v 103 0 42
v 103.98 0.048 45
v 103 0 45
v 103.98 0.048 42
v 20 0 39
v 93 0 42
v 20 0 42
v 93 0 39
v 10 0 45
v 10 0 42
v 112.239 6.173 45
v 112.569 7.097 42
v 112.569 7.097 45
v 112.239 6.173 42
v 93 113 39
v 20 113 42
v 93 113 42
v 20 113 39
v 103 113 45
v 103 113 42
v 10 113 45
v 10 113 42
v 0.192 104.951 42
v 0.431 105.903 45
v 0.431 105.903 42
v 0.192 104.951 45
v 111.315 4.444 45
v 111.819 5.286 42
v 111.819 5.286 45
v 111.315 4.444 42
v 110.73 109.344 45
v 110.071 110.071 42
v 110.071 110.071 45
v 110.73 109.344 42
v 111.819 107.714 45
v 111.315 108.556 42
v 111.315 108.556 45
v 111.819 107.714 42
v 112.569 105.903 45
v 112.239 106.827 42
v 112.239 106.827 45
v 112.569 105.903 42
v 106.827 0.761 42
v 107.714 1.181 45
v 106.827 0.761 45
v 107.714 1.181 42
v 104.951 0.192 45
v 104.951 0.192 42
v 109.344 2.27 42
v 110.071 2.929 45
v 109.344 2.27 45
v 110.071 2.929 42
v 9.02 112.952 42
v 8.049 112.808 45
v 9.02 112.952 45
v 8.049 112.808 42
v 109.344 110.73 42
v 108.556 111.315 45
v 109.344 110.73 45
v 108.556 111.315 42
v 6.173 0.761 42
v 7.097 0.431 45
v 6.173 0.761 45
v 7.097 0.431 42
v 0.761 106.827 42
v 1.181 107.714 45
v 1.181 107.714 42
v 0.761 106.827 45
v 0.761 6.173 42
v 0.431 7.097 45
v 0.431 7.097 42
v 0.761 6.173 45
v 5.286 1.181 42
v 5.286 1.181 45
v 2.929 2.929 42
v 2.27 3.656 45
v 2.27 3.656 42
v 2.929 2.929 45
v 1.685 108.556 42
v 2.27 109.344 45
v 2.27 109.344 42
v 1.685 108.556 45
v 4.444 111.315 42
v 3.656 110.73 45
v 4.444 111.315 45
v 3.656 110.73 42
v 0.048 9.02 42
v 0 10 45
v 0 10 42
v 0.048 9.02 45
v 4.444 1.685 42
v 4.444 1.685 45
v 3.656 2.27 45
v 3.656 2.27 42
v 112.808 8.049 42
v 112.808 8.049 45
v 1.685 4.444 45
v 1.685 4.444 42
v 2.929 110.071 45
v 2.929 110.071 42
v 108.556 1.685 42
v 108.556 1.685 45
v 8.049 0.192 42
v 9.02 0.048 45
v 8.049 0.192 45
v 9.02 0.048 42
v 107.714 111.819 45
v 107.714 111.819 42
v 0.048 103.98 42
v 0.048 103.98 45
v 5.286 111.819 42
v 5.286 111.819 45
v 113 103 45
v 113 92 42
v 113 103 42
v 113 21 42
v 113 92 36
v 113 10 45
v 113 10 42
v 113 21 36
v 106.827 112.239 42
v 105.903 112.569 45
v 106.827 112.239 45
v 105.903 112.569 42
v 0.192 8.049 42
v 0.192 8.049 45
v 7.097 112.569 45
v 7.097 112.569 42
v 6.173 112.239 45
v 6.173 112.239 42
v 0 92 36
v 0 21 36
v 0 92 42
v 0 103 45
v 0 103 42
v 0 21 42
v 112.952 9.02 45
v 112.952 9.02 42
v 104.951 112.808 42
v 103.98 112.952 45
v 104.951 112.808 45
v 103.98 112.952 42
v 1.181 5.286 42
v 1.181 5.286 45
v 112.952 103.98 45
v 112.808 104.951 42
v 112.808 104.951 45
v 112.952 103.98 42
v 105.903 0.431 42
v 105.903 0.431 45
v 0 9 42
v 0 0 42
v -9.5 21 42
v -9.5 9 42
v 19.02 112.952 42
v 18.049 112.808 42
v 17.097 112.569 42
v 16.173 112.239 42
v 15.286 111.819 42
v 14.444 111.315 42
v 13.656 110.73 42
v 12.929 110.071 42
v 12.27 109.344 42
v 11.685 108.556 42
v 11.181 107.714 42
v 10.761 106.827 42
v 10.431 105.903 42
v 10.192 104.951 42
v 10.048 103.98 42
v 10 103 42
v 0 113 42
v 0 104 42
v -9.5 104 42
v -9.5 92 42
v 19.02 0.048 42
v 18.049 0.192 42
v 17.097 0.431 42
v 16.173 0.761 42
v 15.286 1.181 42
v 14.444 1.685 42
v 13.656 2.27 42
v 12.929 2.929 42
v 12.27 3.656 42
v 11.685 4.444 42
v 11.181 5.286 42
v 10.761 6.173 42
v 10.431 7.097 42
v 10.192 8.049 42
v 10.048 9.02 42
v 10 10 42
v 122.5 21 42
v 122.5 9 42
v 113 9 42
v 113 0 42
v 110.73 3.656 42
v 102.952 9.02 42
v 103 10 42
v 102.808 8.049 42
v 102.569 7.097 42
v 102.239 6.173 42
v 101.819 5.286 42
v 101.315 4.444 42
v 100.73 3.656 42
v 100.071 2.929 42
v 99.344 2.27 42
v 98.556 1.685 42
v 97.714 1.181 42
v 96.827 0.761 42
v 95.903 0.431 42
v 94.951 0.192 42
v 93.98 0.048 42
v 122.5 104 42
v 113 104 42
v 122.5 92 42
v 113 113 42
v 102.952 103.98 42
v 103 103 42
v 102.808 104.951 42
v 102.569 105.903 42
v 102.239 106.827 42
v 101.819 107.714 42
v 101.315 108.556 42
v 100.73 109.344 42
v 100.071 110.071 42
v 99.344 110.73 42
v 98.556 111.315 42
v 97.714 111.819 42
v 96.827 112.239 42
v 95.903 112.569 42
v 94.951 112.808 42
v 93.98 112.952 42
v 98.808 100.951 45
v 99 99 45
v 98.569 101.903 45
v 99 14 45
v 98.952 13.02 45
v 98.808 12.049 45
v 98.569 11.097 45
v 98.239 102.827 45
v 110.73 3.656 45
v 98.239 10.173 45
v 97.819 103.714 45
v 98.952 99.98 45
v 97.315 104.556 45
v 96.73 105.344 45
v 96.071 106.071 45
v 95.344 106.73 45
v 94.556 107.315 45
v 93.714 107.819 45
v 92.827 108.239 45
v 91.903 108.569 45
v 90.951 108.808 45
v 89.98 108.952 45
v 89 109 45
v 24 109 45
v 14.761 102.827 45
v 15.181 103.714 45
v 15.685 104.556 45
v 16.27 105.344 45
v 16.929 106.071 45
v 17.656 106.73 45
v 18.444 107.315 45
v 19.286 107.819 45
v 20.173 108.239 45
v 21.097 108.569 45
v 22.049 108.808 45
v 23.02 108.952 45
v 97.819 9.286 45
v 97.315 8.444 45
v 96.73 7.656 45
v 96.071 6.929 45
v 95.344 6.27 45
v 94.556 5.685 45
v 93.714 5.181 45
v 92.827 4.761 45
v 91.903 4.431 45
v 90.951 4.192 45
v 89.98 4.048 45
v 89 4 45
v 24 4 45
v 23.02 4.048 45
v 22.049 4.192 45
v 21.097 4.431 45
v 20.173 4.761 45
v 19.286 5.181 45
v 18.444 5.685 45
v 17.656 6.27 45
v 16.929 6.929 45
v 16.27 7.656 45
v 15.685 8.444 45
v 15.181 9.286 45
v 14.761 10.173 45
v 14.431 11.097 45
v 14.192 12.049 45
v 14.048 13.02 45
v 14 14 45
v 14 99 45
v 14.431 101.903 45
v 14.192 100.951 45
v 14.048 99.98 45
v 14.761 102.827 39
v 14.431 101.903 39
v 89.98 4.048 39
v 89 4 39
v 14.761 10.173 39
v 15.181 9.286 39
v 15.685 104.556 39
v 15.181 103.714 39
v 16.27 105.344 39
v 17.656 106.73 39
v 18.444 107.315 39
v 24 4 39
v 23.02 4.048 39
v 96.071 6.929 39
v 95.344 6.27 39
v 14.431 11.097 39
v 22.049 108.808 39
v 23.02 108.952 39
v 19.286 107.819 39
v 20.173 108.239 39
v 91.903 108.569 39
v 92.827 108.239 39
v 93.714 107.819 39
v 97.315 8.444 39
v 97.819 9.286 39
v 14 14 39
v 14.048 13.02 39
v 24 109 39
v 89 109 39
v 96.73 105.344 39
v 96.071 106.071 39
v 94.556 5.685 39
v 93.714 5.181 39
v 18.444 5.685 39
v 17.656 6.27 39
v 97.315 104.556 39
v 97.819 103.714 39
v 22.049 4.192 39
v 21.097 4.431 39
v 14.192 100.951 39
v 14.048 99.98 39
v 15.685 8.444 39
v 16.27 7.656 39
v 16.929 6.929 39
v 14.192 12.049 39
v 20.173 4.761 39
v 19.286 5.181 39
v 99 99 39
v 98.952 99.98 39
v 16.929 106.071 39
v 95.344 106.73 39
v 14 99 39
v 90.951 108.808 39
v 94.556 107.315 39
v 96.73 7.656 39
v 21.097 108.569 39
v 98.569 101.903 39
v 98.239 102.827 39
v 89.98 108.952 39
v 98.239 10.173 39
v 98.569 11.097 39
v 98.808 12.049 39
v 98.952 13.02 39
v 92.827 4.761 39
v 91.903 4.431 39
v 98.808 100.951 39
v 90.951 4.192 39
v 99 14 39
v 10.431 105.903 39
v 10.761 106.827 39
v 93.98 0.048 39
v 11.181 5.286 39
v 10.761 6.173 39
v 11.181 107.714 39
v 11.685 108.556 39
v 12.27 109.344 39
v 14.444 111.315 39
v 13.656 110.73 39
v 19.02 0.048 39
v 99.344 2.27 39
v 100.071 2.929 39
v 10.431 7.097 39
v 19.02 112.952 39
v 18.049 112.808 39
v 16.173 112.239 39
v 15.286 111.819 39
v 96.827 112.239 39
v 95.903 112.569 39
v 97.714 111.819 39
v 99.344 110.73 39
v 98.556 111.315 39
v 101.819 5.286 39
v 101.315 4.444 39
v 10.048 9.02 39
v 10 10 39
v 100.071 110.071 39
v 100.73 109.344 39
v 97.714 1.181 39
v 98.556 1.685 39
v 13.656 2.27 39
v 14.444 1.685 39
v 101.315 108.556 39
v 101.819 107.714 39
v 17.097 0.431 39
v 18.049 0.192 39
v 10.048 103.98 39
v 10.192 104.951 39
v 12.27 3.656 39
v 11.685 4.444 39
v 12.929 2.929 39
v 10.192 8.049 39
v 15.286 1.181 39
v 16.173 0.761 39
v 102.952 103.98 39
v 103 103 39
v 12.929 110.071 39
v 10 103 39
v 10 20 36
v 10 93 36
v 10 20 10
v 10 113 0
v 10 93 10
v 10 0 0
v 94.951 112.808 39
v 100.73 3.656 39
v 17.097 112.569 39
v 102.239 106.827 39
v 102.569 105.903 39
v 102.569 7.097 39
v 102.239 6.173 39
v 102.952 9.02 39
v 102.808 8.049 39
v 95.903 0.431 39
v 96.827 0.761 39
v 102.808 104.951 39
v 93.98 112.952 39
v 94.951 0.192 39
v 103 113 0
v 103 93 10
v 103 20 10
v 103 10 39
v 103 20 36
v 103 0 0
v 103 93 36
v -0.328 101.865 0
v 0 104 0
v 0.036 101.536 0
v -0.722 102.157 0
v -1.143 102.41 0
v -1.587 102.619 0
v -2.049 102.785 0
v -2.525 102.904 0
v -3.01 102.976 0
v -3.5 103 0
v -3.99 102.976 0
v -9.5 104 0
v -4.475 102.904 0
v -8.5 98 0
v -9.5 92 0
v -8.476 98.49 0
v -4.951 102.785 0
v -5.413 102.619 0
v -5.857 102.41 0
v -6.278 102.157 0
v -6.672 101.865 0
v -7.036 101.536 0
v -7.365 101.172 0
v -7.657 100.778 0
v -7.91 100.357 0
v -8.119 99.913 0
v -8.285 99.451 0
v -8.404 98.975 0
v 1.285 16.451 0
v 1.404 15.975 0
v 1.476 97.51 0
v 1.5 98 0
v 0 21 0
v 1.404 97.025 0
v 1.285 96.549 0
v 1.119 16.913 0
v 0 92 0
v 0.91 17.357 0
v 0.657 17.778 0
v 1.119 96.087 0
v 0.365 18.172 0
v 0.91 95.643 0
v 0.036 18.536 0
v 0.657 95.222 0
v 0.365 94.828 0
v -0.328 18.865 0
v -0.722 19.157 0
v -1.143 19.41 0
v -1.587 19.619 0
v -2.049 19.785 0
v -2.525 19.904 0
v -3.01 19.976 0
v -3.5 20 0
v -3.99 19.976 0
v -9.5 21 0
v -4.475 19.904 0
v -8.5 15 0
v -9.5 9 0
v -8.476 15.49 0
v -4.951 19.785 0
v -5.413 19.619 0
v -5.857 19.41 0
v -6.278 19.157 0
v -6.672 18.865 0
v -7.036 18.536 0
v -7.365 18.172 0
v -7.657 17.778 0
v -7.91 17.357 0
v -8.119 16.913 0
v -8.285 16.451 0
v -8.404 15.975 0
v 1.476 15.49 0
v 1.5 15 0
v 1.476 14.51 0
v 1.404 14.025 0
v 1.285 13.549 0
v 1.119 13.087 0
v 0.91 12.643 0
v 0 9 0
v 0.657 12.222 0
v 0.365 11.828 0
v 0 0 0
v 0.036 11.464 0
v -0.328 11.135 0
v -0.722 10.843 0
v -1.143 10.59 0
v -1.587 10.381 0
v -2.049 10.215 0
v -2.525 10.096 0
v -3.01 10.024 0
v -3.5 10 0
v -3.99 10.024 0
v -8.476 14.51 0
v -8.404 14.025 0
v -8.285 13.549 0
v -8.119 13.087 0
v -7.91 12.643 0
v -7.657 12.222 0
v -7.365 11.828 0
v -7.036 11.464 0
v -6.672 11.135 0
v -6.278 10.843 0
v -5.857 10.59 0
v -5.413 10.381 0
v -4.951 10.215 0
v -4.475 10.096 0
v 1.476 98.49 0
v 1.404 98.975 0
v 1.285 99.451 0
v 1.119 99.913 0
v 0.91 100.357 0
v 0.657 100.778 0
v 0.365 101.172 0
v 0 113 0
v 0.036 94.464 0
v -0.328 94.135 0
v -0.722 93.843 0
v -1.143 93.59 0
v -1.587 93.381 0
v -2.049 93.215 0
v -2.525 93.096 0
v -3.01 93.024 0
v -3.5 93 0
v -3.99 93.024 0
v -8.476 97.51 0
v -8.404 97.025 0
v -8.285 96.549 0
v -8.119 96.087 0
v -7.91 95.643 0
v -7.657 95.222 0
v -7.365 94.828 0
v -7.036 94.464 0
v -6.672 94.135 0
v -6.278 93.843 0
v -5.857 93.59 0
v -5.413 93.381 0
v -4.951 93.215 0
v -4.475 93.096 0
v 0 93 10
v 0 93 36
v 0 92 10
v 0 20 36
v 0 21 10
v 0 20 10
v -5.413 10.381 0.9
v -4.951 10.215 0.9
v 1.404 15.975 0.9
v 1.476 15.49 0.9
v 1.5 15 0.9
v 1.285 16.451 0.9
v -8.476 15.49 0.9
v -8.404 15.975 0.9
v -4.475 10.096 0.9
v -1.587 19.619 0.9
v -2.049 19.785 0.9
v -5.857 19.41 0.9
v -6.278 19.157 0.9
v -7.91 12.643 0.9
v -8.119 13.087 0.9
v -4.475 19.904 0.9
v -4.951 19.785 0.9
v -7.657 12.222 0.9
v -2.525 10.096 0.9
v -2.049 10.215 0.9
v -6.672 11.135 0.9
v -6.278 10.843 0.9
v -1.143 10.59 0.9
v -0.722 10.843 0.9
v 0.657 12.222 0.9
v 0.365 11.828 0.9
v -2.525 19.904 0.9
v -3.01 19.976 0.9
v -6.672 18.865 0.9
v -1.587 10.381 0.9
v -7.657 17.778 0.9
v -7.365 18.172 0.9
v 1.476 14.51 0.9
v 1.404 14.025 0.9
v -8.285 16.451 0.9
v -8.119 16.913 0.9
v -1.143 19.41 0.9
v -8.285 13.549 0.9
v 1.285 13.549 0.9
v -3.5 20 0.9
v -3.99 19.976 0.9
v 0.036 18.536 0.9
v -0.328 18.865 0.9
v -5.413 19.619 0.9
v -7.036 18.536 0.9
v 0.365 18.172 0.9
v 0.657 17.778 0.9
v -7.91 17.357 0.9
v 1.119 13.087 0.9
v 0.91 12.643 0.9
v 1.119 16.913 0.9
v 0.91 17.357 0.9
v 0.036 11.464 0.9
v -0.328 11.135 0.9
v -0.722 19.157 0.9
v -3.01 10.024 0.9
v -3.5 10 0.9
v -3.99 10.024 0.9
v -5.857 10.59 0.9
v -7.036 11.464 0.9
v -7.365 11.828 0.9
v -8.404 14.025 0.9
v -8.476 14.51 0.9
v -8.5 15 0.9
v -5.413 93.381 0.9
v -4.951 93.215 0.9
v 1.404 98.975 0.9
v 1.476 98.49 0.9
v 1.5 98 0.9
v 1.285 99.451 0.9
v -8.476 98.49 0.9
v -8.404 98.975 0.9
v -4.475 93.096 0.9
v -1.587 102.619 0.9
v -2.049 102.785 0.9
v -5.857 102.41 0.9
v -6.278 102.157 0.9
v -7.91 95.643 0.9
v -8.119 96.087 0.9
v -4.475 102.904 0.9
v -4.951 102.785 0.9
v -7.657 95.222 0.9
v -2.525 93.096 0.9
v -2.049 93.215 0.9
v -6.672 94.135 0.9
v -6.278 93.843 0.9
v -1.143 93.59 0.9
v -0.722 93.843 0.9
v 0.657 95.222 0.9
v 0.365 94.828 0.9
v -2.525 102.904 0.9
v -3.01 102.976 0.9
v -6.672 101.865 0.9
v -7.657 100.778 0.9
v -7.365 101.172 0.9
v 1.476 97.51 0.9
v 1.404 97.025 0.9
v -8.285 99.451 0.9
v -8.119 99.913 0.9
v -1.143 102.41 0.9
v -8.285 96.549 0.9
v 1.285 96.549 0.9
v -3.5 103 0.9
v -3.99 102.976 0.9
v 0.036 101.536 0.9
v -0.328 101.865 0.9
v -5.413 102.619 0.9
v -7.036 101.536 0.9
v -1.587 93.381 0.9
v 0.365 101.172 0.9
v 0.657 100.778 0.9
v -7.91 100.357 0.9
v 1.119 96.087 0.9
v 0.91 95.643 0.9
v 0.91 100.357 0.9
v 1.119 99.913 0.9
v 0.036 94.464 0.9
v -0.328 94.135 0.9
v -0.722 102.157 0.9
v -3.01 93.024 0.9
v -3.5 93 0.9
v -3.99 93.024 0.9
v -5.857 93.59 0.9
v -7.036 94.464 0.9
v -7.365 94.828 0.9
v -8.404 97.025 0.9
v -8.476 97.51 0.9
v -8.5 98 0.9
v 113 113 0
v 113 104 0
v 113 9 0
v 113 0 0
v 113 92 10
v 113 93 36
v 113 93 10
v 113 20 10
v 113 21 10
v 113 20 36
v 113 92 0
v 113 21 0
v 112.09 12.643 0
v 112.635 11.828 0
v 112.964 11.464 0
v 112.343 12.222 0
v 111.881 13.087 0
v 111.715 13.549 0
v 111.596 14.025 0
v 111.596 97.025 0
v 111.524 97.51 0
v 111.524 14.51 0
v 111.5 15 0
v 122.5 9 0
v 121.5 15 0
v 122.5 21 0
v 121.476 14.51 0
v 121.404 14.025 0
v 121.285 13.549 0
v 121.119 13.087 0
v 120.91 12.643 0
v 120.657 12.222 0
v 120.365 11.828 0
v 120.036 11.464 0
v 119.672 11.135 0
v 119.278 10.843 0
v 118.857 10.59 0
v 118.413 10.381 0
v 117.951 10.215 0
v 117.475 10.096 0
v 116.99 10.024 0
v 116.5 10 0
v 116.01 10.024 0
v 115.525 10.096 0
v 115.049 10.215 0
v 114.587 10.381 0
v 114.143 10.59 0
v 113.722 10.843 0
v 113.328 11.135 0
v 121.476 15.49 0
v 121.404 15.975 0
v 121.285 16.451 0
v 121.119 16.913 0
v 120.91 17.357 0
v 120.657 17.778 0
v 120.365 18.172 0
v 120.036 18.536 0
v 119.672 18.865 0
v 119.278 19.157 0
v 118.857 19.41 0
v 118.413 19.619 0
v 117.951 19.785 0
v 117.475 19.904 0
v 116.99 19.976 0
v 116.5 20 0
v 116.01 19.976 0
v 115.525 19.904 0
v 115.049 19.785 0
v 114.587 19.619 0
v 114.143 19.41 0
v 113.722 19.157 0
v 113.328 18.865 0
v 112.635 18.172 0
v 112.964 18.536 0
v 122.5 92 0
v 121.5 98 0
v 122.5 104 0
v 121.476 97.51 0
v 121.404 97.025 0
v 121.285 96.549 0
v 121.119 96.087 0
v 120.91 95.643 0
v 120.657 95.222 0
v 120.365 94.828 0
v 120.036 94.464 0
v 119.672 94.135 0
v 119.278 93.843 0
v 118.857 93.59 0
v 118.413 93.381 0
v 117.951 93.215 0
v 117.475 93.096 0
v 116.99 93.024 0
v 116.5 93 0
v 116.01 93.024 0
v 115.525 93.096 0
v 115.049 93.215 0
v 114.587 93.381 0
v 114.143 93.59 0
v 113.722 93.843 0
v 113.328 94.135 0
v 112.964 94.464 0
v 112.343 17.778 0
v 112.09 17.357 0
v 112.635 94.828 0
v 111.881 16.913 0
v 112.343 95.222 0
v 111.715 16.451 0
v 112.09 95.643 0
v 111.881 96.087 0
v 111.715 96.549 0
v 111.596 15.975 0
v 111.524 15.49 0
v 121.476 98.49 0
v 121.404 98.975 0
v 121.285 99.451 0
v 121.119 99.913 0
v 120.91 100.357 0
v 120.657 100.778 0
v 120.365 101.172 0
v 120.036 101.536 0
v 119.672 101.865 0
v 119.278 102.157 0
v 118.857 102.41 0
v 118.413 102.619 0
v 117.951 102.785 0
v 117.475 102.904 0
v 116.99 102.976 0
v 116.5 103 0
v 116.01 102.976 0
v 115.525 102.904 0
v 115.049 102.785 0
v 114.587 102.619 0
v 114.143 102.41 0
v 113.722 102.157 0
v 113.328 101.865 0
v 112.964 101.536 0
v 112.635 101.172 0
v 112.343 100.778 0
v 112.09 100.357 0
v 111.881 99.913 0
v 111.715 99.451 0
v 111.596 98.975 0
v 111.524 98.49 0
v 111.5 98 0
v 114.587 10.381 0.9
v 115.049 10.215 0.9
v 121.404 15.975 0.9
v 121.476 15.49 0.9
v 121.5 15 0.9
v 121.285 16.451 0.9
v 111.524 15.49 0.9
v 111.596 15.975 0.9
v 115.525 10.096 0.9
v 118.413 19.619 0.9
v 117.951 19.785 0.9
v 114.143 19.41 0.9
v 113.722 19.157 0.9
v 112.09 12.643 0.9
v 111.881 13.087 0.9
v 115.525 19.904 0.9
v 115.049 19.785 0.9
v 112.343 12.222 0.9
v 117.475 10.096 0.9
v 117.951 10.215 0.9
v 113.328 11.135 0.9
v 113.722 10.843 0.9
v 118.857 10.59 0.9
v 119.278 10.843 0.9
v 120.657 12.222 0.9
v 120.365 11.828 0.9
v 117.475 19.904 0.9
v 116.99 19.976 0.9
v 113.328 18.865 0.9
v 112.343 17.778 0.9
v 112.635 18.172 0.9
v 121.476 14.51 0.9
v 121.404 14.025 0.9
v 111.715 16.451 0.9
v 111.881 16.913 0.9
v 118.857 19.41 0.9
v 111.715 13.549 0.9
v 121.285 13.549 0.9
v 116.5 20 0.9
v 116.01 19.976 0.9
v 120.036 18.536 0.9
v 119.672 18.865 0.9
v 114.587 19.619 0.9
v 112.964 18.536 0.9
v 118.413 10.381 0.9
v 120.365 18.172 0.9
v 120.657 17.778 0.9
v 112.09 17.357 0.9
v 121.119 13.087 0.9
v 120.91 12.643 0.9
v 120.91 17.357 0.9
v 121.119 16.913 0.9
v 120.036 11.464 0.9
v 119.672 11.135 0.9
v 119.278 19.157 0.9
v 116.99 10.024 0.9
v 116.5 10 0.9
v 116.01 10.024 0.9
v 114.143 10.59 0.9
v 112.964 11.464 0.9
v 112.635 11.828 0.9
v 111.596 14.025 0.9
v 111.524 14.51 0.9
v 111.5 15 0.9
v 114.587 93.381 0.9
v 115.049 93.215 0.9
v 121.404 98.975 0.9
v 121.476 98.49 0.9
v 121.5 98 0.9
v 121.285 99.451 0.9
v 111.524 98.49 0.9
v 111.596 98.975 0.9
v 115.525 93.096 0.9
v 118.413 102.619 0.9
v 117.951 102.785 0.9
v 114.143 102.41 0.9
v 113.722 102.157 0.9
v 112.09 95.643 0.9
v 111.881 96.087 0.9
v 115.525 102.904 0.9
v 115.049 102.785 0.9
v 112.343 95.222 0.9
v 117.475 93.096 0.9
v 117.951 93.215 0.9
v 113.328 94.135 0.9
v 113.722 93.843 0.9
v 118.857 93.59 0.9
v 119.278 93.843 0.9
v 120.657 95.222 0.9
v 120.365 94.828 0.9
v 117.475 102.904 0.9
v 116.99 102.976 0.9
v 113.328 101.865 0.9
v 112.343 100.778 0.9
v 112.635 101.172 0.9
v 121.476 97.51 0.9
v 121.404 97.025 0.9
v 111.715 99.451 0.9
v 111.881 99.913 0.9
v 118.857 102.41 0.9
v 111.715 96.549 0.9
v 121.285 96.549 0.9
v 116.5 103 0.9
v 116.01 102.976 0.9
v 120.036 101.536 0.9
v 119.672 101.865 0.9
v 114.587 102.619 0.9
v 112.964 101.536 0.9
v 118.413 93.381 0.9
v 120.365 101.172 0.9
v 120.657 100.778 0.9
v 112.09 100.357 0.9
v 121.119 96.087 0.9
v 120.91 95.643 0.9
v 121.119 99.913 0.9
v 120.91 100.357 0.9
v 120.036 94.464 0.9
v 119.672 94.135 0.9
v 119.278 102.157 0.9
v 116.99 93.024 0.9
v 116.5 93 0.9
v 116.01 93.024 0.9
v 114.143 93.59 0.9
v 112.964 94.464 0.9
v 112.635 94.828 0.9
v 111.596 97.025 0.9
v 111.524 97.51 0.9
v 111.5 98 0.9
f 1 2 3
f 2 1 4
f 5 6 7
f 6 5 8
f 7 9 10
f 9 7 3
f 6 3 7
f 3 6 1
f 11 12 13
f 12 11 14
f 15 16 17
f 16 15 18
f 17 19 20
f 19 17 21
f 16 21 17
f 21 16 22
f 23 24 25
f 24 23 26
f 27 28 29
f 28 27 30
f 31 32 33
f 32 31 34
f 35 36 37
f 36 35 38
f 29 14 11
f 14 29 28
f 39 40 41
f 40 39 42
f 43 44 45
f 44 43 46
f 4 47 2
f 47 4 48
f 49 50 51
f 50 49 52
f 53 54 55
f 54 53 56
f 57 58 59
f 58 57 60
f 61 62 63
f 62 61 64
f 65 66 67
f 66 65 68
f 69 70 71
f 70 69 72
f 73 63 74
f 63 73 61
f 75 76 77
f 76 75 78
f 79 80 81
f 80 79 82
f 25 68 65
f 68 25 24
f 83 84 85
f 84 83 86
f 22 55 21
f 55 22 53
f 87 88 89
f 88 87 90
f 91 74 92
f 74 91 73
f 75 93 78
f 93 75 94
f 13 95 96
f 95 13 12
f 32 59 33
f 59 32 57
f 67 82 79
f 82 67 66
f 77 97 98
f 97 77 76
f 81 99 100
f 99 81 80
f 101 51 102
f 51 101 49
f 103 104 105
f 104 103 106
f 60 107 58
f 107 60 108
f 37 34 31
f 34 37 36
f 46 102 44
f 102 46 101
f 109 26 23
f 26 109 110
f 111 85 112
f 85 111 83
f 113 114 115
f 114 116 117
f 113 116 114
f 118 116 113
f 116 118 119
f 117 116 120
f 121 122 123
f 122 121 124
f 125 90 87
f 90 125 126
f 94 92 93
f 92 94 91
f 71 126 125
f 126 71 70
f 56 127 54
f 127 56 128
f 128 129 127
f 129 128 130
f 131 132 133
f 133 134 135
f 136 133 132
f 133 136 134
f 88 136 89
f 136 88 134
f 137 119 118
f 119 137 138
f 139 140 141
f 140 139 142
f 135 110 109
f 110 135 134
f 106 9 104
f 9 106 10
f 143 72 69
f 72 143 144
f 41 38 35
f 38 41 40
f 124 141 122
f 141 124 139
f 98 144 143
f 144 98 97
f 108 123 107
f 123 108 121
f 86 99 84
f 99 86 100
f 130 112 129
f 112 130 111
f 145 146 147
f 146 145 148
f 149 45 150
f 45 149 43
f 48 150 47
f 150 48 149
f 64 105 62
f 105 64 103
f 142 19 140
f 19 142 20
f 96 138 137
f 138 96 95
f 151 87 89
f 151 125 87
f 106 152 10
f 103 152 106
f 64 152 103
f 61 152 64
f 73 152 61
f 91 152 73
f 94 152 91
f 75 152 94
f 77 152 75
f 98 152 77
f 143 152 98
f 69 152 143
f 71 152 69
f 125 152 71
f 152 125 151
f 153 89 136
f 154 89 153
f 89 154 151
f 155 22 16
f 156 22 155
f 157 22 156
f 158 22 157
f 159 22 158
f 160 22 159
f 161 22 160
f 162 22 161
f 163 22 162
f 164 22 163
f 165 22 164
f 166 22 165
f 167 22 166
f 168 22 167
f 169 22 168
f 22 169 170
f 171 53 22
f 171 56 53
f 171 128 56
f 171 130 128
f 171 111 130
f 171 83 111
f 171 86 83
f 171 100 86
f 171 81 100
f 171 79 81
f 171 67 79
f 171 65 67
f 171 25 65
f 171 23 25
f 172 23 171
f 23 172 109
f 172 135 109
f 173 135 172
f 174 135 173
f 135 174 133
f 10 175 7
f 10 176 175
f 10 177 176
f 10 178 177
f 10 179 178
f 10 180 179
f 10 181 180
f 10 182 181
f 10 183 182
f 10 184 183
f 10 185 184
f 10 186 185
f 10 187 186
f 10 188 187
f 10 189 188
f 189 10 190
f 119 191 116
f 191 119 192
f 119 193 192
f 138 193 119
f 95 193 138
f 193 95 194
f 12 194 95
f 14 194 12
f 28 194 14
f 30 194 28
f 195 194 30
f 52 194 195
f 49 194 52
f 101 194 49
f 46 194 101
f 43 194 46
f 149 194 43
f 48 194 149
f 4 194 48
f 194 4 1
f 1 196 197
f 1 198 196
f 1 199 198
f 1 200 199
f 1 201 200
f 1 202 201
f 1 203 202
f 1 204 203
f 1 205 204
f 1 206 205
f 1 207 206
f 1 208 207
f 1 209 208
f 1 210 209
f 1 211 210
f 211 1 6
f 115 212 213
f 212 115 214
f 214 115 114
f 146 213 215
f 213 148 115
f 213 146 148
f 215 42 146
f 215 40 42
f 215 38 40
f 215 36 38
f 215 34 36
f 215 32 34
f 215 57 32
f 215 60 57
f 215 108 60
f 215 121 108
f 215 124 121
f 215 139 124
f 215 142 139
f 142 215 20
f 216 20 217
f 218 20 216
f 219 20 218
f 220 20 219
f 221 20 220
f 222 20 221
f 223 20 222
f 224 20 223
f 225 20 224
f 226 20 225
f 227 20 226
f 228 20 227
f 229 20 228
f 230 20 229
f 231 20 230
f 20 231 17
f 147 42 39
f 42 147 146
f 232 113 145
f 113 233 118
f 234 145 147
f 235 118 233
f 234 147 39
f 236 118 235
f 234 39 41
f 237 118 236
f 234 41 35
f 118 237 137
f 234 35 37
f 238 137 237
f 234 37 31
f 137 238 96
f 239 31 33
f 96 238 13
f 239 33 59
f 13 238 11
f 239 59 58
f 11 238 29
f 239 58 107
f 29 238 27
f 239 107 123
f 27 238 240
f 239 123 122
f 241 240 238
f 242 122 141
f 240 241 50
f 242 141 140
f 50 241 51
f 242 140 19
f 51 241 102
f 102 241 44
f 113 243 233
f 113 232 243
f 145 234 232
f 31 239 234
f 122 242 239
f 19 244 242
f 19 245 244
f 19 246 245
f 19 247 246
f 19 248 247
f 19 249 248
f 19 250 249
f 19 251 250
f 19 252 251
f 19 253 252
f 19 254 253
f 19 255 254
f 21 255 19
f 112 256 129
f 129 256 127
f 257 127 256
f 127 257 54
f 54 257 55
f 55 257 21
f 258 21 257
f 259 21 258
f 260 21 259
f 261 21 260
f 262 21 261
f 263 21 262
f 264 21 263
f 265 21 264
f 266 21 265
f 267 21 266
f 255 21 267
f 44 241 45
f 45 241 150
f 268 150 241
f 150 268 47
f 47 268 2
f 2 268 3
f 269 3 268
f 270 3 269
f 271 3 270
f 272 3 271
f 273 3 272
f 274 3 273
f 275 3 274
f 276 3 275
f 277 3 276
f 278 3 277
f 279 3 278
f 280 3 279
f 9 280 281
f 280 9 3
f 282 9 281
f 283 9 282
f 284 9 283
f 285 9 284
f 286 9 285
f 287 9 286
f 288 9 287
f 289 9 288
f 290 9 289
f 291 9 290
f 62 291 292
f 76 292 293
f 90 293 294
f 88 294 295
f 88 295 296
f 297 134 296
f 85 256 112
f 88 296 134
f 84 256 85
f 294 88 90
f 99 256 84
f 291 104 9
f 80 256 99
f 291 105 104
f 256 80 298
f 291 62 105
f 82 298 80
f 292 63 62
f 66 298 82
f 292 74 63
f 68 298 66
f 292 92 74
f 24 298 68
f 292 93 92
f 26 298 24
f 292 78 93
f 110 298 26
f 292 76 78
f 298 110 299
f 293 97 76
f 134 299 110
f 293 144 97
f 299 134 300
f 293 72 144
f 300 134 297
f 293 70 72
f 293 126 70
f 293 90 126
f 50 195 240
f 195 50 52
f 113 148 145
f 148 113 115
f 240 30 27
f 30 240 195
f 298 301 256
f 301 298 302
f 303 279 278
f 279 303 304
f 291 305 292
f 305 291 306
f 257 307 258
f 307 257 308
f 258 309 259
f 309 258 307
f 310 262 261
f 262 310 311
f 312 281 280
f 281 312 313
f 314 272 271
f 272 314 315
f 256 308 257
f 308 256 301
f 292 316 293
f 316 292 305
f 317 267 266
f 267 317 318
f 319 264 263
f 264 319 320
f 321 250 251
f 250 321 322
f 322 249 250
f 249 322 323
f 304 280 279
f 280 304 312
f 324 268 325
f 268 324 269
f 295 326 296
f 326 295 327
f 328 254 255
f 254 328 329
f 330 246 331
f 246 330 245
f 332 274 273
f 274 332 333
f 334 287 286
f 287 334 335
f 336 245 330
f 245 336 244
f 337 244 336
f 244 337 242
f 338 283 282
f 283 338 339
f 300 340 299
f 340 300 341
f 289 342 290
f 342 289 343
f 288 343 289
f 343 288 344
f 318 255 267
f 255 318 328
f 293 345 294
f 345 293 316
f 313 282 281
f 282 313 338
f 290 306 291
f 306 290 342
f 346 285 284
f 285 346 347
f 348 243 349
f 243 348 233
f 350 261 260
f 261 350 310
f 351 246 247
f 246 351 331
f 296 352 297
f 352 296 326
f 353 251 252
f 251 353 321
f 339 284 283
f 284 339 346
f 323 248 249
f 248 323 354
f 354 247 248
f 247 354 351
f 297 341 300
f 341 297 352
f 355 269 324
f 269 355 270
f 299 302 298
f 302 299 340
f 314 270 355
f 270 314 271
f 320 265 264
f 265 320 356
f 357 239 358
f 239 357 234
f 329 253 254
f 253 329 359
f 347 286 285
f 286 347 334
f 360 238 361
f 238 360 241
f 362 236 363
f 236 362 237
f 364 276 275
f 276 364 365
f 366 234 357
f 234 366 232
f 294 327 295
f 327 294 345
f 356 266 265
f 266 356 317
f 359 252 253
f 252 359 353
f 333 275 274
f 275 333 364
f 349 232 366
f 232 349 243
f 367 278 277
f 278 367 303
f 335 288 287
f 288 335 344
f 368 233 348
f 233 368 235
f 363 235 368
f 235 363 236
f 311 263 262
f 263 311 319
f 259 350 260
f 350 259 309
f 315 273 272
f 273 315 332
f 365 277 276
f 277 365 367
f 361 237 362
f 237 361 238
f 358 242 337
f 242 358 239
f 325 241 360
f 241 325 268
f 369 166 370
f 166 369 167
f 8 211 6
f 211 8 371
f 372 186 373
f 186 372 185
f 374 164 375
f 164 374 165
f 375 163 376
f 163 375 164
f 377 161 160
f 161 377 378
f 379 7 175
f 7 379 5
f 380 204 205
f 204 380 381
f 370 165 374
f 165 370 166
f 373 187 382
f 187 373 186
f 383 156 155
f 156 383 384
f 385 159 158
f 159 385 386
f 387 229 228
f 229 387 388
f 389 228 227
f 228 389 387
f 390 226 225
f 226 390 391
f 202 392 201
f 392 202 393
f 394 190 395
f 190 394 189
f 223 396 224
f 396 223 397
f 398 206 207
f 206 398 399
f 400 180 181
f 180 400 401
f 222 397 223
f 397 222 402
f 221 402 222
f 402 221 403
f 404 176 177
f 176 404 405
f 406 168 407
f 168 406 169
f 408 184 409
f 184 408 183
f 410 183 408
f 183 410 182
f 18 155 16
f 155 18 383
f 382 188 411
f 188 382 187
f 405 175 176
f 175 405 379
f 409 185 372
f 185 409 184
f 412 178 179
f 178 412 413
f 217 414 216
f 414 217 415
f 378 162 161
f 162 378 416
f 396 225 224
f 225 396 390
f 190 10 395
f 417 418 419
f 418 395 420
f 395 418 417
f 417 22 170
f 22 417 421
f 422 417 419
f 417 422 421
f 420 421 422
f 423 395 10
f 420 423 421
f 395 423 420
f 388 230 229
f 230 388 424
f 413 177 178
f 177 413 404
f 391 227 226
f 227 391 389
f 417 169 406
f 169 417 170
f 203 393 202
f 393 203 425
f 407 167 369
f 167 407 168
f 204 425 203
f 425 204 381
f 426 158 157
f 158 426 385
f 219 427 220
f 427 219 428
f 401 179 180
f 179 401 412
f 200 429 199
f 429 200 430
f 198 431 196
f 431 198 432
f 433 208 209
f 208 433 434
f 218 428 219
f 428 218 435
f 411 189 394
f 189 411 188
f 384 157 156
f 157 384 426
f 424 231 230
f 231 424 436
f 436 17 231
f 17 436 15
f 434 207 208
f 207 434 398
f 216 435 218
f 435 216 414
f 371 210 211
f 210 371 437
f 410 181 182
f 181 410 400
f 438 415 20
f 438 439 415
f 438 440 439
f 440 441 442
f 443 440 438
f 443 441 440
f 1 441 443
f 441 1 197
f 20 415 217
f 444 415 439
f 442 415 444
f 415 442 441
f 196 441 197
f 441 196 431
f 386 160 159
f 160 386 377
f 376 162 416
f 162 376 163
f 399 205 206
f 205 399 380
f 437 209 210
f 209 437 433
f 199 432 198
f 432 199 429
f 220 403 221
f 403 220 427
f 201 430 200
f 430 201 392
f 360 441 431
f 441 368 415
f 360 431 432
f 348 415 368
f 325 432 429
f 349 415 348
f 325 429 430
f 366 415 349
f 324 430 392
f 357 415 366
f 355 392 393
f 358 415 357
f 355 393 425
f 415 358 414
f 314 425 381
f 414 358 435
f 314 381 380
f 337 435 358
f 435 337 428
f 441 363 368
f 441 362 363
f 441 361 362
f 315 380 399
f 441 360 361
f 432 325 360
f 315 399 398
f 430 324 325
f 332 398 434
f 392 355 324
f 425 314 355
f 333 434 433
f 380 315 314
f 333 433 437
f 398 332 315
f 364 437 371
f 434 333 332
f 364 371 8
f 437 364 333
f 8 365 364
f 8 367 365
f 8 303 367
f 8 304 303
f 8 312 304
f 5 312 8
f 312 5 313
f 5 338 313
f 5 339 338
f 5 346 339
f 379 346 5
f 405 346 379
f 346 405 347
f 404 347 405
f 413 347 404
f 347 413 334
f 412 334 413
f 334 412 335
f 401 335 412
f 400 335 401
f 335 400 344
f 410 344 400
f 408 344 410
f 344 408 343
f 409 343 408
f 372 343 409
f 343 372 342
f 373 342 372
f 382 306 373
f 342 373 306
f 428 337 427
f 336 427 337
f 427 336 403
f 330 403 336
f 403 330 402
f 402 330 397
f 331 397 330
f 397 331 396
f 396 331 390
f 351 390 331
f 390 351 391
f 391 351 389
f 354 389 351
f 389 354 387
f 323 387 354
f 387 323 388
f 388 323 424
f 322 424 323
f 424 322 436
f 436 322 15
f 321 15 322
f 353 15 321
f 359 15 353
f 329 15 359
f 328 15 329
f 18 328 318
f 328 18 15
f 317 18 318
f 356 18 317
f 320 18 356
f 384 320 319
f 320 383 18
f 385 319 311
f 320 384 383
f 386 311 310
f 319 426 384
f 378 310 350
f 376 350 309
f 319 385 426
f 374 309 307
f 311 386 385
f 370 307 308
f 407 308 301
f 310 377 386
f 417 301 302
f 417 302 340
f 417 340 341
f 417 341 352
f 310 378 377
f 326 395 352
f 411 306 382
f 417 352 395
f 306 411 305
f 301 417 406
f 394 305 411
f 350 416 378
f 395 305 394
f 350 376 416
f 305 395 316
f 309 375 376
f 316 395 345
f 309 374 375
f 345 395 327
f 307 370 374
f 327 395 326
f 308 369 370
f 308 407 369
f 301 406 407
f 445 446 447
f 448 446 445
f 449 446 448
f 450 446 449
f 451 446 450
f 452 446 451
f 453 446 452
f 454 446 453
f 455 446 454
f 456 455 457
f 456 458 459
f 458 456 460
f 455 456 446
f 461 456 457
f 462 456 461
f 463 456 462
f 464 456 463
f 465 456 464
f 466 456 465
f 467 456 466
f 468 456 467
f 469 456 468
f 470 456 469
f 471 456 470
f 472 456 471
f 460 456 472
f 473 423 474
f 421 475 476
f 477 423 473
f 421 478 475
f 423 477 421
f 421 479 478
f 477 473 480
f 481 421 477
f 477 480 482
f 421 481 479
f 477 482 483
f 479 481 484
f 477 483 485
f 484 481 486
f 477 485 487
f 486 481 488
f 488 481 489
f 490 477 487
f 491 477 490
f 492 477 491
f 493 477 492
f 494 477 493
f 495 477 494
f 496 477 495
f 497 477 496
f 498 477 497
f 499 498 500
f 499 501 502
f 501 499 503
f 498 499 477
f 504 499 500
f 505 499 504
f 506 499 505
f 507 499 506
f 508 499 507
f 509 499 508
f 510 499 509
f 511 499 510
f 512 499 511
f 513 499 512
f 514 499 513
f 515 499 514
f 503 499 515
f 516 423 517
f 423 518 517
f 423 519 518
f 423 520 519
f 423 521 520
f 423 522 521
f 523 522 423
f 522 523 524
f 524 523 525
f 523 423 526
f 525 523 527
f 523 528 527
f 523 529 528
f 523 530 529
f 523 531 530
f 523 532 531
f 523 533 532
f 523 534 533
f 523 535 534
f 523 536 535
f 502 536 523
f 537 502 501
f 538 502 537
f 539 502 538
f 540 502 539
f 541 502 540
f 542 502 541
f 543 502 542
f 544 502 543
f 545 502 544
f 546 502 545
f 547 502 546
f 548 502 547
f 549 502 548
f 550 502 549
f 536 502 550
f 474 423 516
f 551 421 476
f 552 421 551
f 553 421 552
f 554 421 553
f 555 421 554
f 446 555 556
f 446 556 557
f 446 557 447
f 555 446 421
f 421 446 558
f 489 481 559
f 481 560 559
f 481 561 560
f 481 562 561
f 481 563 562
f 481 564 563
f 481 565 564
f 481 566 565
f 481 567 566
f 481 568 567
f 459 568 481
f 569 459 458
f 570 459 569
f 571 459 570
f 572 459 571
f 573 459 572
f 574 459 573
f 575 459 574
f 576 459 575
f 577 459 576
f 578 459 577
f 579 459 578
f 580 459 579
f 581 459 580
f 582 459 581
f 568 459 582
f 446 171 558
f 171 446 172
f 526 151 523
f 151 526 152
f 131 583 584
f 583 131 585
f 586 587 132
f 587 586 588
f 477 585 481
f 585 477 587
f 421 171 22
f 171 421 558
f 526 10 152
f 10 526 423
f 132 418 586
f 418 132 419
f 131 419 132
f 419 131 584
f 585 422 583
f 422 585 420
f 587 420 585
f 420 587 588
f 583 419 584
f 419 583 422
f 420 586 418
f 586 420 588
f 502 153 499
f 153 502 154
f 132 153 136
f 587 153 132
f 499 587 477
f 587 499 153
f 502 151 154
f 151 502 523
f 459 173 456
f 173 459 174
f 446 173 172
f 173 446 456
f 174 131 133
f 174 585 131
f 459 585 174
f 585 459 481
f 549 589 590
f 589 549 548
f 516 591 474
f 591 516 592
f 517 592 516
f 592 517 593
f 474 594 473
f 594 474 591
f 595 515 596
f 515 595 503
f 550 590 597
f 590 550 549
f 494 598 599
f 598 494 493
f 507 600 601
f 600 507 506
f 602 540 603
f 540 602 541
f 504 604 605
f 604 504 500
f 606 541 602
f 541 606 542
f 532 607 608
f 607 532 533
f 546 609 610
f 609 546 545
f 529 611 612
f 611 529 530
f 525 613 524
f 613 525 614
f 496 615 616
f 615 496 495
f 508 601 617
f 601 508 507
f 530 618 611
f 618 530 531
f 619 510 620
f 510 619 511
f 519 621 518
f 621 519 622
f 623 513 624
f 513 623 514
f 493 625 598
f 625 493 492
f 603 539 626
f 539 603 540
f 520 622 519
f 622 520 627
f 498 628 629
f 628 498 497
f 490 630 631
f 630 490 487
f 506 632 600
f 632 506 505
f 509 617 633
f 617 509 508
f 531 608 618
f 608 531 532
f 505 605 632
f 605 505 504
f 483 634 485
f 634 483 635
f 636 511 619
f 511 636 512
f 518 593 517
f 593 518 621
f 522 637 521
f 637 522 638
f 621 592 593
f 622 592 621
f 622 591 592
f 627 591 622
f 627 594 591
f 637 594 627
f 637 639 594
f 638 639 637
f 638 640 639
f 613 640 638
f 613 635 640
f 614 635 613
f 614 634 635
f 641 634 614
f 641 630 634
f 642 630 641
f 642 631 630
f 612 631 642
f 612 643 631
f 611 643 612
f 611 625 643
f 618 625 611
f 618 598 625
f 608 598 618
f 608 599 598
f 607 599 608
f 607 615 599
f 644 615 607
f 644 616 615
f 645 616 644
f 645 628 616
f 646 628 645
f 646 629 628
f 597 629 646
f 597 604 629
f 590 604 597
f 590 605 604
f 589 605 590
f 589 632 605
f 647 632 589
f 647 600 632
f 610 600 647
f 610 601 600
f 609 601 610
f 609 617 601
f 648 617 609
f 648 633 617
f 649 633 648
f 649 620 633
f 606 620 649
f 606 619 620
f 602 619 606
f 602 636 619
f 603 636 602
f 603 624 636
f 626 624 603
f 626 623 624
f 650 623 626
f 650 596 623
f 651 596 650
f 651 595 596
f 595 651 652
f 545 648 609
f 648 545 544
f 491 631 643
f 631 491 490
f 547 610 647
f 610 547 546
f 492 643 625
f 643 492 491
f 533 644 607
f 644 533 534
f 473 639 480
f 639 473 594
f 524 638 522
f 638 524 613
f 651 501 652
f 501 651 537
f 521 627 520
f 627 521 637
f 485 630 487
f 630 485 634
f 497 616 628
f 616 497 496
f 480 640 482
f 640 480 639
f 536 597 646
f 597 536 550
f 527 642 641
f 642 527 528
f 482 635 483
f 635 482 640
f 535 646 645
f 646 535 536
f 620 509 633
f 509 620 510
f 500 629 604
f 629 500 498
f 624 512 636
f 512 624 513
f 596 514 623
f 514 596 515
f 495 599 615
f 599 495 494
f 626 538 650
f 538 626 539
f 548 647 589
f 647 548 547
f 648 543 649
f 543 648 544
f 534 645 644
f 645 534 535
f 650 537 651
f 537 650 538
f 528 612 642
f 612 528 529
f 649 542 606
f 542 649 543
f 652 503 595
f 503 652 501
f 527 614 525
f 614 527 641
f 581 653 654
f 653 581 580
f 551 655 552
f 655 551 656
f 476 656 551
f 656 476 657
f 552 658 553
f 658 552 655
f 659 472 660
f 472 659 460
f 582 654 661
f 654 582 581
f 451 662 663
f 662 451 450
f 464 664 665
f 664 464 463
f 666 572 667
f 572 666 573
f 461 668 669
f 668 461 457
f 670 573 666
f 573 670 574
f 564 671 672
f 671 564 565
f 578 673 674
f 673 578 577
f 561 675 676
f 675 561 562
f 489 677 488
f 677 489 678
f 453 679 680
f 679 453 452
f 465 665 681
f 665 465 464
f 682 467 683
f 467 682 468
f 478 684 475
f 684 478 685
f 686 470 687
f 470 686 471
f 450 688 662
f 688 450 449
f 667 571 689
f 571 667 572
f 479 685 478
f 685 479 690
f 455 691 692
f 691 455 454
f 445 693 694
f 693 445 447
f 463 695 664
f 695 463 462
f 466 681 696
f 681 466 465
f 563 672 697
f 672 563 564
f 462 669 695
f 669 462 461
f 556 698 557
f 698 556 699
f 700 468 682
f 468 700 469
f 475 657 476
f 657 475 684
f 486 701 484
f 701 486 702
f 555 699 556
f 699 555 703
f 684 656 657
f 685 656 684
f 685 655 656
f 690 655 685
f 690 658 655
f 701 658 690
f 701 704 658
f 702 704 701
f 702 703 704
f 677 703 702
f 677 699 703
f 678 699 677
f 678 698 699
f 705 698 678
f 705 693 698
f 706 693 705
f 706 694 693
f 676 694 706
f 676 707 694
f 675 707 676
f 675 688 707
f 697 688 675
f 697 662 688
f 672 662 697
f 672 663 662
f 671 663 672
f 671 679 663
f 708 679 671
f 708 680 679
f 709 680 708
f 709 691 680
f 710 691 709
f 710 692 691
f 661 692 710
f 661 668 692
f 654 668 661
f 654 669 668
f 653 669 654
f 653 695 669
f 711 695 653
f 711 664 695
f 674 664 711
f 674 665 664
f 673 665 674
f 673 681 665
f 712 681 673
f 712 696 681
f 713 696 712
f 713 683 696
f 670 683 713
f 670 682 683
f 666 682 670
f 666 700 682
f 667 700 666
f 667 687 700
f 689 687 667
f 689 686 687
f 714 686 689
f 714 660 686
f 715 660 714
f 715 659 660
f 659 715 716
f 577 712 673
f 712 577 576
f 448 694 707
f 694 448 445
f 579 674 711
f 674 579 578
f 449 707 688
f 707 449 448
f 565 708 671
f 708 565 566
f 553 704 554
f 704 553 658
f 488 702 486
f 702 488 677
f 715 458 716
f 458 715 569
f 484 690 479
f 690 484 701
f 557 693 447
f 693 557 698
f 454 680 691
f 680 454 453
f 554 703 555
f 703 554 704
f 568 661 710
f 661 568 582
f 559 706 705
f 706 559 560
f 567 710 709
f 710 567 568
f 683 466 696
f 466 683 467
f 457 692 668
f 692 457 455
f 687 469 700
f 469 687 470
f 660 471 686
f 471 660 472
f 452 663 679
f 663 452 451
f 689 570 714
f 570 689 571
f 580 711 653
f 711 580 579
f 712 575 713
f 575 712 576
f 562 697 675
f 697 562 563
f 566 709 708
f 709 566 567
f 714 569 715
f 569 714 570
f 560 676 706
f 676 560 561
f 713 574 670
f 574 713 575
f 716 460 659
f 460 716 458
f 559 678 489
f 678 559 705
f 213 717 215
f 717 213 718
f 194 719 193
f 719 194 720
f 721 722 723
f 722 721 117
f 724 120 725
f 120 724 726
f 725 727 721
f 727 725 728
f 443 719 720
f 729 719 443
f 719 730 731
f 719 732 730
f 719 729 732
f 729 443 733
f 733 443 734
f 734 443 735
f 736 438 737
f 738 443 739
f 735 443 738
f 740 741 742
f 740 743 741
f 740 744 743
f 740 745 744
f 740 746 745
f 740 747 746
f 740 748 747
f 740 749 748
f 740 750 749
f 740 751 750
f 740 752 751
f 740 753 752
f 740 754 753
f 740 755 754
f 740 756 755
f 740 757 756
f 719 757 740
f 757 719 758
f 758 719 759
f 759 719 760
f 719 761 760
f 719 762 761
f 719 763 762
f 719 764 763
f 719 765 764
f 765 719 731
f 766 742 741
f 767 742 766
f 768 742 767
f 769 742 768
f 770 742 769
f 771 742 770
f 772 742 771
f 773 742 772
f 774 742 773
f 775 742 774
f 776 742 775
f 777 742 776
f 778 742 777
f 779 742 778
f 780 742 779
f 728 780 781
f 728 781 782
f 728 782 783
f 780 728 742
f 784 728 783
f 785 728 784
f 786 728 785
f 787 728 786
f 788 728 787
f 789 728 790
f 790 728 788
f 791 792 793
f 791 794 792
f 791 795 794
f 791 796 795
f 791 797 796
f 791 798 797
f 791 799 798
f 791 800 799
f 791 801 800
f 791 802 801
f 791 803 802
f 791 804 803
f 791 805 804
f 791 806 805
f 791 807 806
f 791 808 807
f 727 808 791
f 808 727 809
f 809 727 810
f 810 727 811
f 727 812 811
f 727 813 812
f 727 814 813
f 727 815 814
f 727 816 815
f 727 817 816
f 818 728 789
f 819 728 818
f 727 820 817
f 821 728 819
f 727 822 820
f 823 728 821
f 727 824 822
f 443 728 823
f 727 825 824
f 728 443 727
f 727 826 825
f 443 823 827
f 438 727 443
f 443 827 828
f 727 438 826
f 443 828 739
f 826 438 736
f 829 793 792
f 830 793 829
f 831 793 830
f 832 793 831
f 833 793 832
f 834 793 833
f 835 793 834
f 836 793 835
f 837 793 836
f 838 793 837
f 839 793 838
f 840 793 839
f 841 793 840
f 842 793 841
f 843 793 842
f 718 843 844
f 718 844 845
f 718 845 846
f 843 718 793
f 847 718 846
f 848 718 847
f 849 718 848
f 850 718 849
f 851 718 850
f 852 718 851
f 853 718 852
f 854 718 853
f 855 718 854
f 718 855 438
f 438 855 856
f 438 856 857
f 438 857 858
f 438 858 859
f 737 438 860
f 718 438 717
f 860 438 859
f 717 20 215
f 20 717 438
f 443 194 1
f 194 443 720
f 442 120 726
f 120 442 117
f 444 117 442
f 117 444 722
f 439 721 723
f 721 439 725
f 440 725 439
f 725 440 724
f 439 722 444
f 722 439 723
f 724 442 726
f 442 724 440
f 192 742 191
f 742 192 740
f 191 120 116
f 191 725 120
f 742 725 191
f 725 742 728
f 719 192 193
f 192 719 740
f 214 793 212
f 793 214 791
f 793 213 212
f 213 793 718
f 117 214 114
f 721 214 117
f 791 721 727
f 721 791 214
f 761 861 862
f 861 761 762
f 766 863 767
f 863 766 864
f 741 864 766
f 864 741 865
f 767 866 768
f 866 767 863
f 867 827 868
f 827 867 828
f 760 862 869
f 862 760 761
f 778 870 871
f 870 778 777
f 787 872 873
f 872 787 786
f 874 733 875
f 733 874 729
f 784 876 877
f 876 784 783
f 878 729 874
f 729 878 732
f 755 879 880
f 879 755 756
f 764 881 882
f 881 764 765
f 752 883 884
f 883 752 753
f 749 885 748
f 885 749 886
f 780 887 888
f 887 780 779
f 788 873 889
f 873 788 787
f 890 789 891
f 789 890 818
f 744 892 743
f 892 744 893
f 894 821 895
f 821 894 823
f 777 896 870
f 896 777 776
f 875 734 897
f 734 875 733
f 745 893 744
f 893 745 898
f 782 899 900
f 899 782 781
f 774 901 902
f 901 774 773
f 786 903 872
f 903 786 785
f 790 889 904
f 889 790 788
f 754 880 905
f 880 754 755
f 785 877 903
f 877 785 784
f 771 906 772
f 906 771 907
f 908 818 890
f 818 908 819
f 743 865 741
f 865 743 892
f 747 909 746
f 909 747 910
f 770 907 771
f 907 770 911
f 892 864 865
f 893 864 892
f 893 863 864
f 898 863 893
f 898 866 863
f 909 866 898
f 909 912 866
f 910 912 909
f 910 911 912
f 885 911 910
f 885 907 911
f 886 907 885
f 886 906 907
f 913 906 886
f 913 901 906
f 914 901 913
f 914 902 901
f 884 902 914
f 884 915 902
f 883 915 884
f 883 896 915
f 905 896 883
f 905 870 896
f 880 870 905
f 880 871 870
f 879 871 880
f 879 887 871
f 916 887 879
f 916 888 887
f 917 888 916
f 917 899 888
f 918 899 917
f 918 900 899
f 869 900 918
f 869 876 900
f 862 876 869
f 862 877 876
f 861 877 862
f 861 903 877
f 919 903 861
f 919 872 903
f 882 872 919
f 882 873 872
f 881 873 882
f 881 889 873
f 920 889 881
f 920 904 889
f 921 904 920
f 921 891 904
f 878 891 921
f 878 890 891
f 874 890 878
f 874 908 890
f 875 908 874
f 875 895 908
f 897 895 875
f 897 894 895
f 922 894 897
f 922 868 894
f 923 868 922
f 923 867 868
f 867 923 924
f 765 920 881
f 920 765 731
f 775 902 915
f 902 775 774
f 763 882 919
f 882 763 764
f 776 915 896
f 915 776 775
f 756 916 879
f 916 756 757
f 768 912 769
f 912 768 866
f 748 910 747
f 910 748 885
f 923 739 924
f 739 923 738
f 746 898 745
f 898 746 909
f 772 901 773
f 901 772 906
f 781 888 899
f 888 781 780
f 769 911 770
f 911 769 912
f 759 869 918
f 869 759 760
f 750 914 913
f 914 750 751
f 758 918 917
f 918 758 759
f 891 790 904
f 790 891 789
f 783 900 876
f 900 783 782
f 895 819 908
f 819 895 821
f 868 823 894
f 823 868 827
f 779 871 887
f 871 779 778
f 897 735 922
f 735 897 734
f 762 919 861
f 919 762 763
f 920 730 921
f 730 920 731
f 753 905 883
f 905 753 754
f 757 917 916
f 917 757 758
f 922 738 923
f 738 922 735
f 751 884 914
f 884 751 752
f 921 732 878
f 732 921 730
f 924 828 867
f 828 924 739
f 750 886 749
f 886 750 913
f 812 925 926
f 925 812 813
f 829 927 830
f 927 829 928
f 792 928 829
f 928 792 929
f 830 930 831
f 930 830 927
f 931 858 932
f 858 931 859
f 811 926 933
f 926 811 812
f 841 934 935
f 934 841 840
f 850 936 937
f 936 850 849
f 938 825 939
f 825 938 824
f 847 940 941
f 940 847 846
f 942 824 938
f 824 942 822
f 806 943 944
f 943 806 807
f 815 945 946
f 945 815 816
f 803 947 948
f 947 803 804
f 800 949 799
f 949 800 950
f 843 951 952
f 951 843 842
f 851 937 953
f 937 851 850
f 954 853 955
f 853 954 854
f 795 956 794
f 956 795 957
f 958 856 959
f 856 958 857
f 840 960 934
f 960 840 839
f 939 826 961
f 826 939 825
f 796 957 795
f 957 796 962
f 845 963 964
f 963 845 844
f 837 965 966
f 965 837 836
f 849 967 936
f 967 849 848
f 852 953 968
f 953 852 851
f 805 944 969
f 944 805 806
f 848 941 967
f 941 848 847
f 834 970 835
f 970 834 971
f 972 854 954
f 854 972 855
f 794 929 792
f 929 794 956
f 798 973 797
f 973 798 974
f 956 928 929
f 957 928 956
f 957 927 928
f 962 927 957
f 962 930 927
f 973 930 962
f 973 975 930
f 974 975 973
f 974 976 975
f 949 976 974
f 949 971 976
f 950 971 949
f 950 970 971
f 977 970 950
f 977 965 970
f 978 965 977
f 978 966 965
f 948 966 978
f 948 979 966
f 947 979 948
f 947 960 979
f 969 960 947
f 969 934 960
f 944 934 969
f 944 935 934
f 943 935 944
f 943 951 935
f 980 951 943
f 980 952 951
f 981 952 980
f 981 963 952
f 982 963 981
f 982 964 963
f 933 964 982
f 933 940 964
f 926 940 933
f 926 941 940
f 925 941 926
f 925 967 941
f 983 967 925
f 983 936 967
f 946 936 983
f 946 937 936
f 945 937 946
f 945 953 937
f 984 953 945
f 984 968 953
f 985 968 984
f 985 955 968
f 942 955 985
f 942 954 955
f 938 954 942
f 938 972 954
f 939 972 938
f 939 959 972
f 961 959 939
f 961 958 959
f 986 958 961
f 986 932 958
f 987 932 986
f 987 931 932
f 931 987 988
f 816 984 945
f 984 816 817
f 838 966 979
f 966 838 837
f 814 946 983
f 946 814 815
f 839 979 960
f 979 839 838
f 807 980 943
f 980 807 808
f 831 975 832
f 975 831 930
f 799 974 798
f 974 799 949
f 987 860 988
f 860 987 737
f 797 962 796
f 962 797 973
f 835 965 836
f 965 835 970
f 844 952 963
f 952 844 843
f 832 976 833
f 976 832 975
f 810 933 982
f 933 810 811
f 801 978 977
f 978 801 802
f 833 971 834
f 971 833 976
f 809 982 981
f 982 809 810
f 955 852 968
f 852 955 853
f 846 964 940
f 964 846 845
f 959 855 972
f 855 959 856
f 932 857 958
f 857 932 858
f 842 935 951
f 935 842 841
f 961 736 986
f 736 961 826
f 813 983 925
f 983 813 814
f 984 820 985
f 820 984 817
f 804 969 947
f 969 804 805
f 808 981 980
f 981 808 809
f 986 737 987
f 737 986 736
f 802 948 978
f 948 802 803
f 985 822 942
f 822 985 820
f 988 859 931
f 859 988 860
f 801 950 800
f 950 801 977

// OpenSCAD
// Apple TV Retention Bracket for 1U Vented Rack Shelf
//
// A top-down retention bracket that secures an Apple TV 4K to a vented rack shelf.
// Side walls connect via a top plate with ventilation cutout.
// Front and back are completely open for cable access and airflow.
// Bracket attaches using M4/M5 screws from below the shelf, threading into
// heat-set inserts embedded in the bracket's insert bosses.
//
// PRINT ORIENTATION: Print upside-down (top plate on build plate) for best results.
// Rotate 180° around X axis in your slicer before printing.
// No supports needed. Use 3+ perimeters for insert boss strength.

/* [Device Dimensions] */
// Width of the Apple TV 4K
device_width = 93; // [80:1:120]
// Depth of the Apple TV 4K
device_depth = 93; // [80:1:120]
// Height of the Apple TV 4K
device_height = 31; // [20:1:50]

/* [Bracket Dimensions] */
// Overall bracket width (device width + 2 × wall thickness)
bracket_width = 113; // [100:1:150]
// Overall bracket depth
bracket_depth = 113; // [100:1:150]
// Top plate thickness
top_plate_thickness = 3; // [2:0.5:5]
// Side wall height (provides 11mm clearance above 31mm device, minus lip_radius for net clearance)
side_wall_height = 42; // [30:1:60]
// Side wall thickness
wall_thickness = 10; // [5:1:15]

/* [Ventilation Cutout] */
// Width of center ventilation cutout
cutout_width = 73; // [50:1:100]
// Depth of center ventilation cutout
cutout_depth = 93; // [50:1:100]

/* [Retention Lip] */
// How far the lip extends inward over the device
lip_overhang = 4; // [2:1:10]
// Thickness of the lip (hangs down from top plate)
lip_thickness = 3; // [2:1:6]
// Corner radius for squircle shape
corner_radius = 10; // [5:1:20]

/* [Threaded Insert Bosses] */
// Insert size: M4 or M5
insert_size = "M4"; // [M4, M5]
// Boss outer diameter
boss_diameter = 12; // [10:1:20]
// Boss height (extends below wall bottom)
boss_height = 10; // [8:1:15]
// M4 insert hole diameter (typical for heat-set inserts)
m4_hole_diameter = 5.6; // [5.0:0.1:6.0]
// M5 insert hole diameter (typical for heat-set inserts)
m5_hole_diameter = 6.4; // [6.0:0.1:7.0]
// Insert hole depth
insert_hole_depth = 8; // [6:1:12]
// Front insert distance from front edge (center of boss)
front_insert_offset = 15; // [10:1:30]
// Back insert distance from back edge (center of boss)
back_insert_offset = 15; // [10:1:30]
// Boss overhang from wall OUTWARD (for slot alignment: 3.5mm gives 120mm = 6 × 20mm spacing)
boss_overhang = 3.5; // [0:0.5:20]

/* [Rendering] */
$fa = 1;
$fn = 64;

// Calculate insert hole diameter based on selected size
insert_hole_diameter = (insert_size == "M5") ? m5_hole_diameter : m4_hole_diameter;

// 2D rounded rectangle (squircle)
module rounded_rect(width, depth, radius) {
    offset(r = radius)
    offset(r = -radius)
        square([width, depth], center = true);
}

// Top plate with rounded cutout and integrated retention lip
module top_plate() {
    // Inner dimensions (device cavity)
    inner_width = bracket_width - 2 * wall_thickness;
    inner_depth = bracket_depth;  // Open front/back

    difference() {
        // Outer plate with rounded corners
        translate([bracket_width/2, bracket_depth/2, 0])
            linear_extrude(height = top_plate_thickness)
            rounded_rect(bracket_width, bracket_depth, corner_radius);

        // Center ventilation cutout (smaller than inner, leaves lip)
        translate([bracket_width/2, bracket_depth/2, -0.5])
            linear_extrude(height = top_plate_thickness + 1)
            rounded_rect(inner_width - 2*lip_overhang, inner_depth - 2*lip_overhang, corner_radius);
    }

    // Retention lip hanging down from top plate
    translate([0, 0, -lip_thickness])
    difference() {
        // Outer boundary of lip (same as inner edge of top plate frame)
        translate([bracket_width/2, bracket_depth/2, 0])
            linear_extrude(height = lip_thickness)
            rounded_rect(inner_width, inner_depth, corner_radius);

        // Inner cutout (device clearance)
        translate([bracket_width/2, bracket_depth/2, -0.5])
            linear_extrude(height = lip_thickness + 1)
            rounded_rect(inner_width - 2*lip_overhang, inner_depth - 2*lip_overhang, corner_radius);
    }
}

// Threaded insert boss with hole for heat-set insert
// Boss sits flush with wall bottom at Z=0, extends upward
module insert_boss() {
    difference() {
        // Cylindrical boss - from shelf level (Z=0) up into wall structure
        cylinder(d = boss_diameter, h = boss_height);

        // Insert hole (from bottom at Z=0, for screw from below shelf)
        translate([0, 0, -0.5])
            cylinder(d = insert_hole_diameter, h = insert_hole_depth + 0.5);
    }
}

// Counterbore cut - applied after boss and flange are combined
module counterbore_cut() {
    counterbore_depth = 1; // Subtle step to indicate insert location
    counterbore_diameter = boss_diameter - 2; // Step around insert hole
    cylinder(d = counterbore_diameter, h = counterbore_depth);
}

// Flange to support insert boss extending OUTWARD (away from device)
// Boss rests on shelf surface, screw from below creates clamping force
// Flange extends full wall height to connect boss to wall structure
module boss_flange(y_pos, is_left) {
    flange_width = boss_overhang + boss_diameter / 2; // Extends to support boss center

    // Flange extends from wall OUTWARD (away from device)
    // Full height from Z=0 (shelf) to side_wall_height
    // Left wall: flange goes left (negative X)
    // Right wall: flange goes right (positive X from wall outer edge)
    translate([is_left ? -flange_width : wall_thickness,
               y_pos - boss_diameter / 2,
               0])
        cube([flange_width, boss_diameter, side_wall_height]);
}

// Side wall with insert bosses on OUTWARD flanges at front and back corners
// Bosses extend outward (over shelf vent area), everything sits flush on shelf at Z=0
module side_wall(is_left) {
    // X position for boss center (overhangs OUTWARD away from device)
    // Left wall: boss is to the left of wall (-overhang)
    // Right wall: boss is to the right of wall (wall_thickness + overhang)
    boss_x = is_left ? (-boss_overhang) : (wall_thickness + boss_overhang);

    // Wall hollowing parameters
    wall_frame_width = 20; // Solid material at front and back of wall
    wall_frame_top = 6; // Solid material at top of wall (connects to top plate)
    wall_frame_bottom = 10; // Solid material at bottom (structural + boss support)

    // Apply counterbore cuts AFTER combining boss and flange geometry
    difference() {
        union() {
            // Hollowed wall body - frame with cutout in middle
            difference() {
                cube([wall_thickness, bracket_depth, side_wall_height]);

                // Cutout in middle of wall (leave frame around edges)
                translate([-0.5,
                           wall_frame_width,
                           wall_frame_bottom])
                    cube([wall_thickness + 1,
                          bracket_depth - 2 * wall_frame_width,
                          side_wall_height - wall_frame_bottom - wall_frame_top]);
            }

            // Front flange and insert boss (extending OUTWARD, flush with wall bottom)
            boss_flange(front_insert_offset, is_left);
            translate([boss_x, front_insert_offset, 0])
                insert_boss();

            // Back flange and insert boss (extending OUTWARD, flush with wall bottom)
            boss_flange(bracket_depth - back_insert_offset, is_left);
            translate([boss_x, bracket_depth - back_insert_offset, 0])
                insert_boss();
        }

        // Counterbore cuts at boss locations (cut from combined geometry)
        translate([boss_x, front_insert_offset, -0.1])
            counterbore_cut();
        translate([boss_x, bracket_depth - back_insert_offset, -0.1])
            counterbore_cut();
    }
}

// Complete bracket assembly
module bracket() {
    // Top plate sits at top of side walls
    translate([0, 0, side_wall_height])
        top_plate();

    // Left side wall (at X = 0, bosses overhang to the left)
    translate([0, 0, 0])
        side_wall(is_left = true);

    // Right side wall (at X = bracket_width - wall_thickness, bosses overhang to the right)
    translate([bracket_width - wall_thickness, 0, 0])
        side_wall(is_left = false);

}

// Main model
// Everything sits flush on shelf at Z = 0
bracket();
